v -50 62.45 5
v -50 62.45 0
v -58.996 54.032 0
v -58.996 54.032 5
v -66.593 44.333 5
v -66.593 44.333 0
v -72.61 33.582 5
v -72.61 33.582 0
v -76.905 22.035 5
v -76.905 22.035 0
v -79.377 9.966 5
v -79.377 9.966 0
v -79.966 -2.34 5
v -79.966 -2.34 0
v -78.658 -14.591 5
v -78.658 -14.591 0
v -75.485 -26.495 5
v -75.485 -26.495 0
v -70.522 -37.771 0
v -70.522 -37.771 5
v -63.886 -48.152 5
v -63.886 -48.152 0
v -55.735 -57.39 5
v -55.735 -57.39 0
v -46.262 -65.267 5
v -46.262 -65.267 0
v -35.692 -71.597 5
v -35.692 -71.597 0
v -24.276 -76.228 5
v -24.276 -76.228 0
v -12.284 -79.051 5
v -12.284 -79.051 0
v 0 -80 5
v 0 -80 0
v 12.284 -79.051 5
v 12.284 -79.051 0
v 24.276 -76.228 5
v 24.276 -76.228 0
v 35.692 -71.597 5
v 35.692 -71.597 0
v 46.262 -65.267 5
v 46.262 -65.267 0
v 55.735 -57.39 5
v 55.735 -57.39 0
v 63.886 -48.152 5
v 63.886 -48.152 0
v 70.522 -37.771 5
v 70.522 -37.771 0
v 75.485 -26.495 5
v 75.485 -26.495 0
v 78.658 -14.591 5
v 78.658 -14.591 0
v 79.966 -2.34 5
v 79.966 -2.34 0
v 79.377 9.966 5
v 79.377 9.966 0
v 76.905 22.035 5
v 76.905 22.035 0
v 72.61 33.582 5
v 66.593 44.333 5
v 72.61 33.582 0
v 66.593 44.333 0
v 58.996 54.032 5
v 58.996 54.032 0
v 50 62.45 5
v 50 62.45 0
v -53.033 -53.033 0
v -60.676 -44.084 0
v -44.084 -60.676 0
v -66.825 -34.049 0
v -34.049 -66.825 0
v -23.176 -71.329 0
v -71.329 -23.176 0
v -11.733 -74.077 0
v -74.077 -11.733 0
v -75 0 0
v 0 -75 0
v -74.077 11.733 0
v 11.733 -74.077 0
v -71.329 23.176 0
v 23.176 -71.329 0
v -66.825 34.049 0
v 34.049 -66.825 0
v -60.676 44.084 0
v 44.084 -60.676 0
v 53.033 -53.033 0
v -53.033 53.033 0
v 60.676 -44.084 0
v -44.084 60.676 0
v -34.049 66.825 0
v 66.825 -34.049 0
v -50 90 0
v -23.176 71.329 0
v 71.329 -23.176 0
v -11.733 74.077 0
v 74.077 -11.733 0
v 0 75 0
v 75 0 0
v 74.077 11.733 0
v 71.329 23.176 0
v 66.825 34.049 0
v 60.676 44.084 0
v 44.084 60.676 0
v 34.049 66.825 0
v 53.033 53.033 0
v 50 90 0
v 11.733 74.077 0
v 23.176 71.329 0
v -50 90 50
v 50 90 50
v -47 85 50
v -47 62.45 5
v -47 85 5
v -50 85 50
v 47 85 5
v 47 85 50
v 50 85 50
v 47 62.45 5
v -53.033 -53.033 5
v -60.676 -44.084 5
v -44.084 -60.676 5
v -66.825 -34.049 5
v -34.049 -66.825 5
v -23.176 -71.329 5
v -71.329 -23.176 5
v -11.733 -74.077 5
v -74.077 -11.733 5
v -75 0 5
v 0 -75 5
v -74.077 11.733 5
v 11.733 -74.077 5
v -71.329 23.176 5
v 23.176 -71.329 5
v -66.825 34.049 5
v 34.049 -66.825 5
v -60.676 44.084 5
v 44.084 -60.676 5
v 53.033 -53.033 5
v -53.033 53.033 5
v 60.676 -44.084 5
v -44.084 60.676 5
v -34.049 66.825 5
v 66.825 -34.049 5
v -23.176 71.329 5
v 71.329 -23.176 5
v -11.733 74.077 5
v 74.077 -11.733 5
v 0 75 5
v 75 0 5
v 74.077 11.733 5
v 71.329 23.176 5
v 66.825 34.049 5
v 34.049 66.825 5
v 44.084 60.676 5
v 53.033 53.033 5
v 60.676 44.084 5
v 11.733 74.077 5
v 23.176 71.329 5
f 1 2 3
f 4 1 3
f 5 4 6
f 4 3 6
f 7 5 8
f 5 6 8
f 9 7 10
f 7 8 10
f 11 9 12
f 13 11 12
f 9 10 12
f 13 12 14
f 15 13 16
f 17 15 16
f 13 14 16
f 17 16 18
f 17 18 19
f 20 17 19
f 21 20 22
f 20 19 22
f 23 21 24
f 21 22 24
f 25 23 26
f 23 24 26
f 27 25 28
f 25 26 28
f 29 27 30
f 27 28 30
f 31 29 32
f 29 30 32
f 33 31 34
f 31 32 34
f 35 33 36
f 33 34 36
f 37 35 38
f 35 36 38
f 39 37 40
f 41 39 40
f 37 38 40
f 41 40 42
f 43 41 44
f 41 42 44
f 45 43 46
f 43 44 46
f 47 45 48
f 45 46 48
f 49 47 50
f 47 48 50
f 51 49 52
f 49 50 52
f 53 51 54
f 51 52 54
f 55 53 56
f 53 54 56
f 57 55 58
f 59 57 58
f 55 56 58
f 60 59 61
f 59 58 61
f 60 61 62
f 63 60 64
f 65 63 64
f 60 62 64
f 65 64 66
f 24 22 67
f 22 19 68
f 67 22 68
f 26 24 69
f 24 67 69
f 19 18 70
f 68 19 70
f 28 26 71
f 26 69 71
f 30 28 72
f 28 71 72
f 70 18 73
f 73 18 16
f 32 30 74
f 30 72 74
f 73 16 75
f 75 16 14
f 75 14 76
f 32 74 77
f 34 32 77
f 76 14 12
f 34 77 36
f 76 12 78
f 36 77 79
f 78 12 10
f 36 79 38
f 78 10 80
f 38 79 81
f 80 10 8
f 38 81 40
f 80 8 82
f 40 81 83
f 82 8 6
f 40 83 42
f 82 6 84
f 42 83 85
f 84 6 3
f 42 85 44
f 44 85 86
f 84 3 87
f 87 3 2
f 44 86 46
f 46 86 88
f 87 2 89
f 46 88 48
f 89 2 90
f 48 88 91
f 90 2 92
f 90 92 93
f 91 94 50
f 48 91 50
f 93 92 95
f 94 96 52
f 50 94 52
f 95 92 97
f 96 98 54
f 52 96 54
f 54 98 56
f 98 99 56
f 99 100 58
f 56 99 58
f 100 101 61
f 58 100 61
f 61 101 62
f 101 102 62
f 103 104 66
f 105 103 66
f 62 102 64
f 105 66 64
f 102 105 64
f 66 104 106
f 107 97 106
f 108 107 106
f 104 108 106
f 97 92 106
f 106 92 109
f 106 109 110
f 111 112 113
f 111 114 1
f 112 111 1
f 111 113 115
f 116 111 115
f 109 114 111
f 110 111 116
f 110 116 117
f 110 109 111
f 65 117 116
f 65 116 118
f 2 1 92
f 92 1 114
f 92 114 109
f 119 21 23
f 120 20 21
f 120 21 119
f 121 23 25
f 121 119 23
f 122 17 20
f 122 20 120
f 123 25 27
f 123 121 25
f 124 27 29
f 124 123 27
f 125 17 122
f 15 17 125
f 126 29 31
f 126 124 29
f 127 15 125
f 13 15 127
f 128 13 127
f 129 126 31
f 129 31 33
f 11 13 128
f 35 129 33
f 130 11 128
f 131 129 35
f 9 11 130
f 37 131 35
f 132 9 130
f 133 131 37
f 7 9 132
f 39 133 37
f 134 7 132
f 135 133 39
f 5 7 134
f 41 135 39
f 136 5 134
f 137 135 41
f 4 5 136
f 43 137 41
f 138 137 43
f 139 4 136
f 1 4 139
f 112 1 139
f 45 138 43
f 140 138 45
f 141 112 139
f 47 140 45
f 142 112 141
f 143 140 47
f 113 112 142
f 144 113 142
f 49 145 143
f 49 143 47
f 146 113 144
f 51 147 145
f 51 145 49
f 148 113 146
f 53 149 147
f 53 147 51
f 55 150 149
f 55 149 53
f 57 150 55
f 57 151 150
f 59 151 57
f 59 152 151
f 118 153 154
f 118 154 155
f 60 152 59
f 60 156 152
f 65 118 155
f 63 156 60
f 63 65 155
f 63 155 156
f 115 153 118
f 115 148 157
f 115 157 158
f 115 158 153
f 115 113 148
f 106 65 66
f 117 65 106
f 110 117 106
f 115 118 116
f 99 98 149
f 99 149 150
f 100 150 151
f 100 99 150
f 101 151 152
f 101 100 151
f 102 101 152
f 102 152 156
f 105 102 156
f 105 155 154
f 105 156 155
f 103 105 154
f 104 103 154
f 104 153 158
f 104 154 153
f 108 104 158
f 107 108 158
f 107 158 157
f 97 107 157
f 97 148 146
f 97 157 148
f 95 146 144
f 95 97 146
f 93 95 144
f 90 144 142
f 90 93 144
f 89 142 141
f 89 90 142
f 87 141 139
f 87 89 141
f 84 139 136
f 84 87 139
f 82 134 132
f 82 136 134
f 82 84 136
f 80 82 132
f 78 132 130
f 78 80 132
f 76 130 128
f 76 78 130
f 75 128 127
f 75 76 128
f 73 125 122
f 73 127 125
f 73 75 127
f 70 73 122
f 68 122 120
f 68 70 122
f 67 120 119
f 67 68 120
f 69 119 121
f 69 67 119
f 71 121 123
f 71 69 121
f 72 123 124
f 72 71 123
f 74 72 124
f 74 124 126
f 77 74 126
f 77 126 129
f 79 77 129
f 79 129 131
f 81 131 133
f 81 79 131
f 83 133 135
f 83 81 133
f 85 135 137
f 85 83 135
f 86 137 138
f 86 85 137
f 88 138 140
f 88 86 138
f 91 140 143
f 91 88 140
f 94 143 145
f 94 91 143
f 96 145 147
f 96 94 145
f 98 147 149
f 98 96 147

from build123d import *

# Parameters (mm, degrees)
F0_R     = 75
F0_W     = 100
F0_H     = 5
F1_DEPTH = 5
F2_DEPTH = 50
F4_DEPTH = 3


with BuildPart() as f1:
    # F0 (on Top) → F1 (new body)
    with BuildSketch(Plane.XY):
        with BuildLine():
            ThreePointArc((-50, 62.449979984), (-34.6410161514, -72.1110255093), (80, 0))
            ThreePointArc((80, 0), (72.1110255093, 34.6410161514), (50, 62.449979984))
            ThreePointArc((50, 62.449979984), (0, 80), (-50, 62.449979984))
        make_face()
        Circle(F0_R, mode=Mode.SUBTRACT)
        with BuildLine():
            ThreePointArc((-50, 62.449979984), (0, 80), (50, 62.449979984))
            Line((50, 62.449979984), (50, 85))
            Line((50, 85), (-50, 85))
            Line((-50, 85), (-50, 62.449979984))
        make_face()
        with Locations((0, 87.5)):
            Rectangle(F0_W, F0_H)
    extrude(amount=F1_DEPTH)

    # F0 (on Top) → F2 (join)
    with BuildSketch(Plane.XY):
        with Locations((0, 87.5)):
            Rectangle(F0_W, F0_H)
    extrude(amount=F2_DEPTH)

    # F3 (on face) → F4 (join)
    with BuildSketch(Plane.YZ.offset(50)):
        Polygon((85, 5), (85, 50), (62.449979984, 5), align=None)
    extrude(amount=-F4_DEPTH)

    # F5: F1 across plane


with BuildPart() as f1_1:
    add(f1.part)
    add(f1.part.mirror(Plane.YZ))


solid = f1_1.part
